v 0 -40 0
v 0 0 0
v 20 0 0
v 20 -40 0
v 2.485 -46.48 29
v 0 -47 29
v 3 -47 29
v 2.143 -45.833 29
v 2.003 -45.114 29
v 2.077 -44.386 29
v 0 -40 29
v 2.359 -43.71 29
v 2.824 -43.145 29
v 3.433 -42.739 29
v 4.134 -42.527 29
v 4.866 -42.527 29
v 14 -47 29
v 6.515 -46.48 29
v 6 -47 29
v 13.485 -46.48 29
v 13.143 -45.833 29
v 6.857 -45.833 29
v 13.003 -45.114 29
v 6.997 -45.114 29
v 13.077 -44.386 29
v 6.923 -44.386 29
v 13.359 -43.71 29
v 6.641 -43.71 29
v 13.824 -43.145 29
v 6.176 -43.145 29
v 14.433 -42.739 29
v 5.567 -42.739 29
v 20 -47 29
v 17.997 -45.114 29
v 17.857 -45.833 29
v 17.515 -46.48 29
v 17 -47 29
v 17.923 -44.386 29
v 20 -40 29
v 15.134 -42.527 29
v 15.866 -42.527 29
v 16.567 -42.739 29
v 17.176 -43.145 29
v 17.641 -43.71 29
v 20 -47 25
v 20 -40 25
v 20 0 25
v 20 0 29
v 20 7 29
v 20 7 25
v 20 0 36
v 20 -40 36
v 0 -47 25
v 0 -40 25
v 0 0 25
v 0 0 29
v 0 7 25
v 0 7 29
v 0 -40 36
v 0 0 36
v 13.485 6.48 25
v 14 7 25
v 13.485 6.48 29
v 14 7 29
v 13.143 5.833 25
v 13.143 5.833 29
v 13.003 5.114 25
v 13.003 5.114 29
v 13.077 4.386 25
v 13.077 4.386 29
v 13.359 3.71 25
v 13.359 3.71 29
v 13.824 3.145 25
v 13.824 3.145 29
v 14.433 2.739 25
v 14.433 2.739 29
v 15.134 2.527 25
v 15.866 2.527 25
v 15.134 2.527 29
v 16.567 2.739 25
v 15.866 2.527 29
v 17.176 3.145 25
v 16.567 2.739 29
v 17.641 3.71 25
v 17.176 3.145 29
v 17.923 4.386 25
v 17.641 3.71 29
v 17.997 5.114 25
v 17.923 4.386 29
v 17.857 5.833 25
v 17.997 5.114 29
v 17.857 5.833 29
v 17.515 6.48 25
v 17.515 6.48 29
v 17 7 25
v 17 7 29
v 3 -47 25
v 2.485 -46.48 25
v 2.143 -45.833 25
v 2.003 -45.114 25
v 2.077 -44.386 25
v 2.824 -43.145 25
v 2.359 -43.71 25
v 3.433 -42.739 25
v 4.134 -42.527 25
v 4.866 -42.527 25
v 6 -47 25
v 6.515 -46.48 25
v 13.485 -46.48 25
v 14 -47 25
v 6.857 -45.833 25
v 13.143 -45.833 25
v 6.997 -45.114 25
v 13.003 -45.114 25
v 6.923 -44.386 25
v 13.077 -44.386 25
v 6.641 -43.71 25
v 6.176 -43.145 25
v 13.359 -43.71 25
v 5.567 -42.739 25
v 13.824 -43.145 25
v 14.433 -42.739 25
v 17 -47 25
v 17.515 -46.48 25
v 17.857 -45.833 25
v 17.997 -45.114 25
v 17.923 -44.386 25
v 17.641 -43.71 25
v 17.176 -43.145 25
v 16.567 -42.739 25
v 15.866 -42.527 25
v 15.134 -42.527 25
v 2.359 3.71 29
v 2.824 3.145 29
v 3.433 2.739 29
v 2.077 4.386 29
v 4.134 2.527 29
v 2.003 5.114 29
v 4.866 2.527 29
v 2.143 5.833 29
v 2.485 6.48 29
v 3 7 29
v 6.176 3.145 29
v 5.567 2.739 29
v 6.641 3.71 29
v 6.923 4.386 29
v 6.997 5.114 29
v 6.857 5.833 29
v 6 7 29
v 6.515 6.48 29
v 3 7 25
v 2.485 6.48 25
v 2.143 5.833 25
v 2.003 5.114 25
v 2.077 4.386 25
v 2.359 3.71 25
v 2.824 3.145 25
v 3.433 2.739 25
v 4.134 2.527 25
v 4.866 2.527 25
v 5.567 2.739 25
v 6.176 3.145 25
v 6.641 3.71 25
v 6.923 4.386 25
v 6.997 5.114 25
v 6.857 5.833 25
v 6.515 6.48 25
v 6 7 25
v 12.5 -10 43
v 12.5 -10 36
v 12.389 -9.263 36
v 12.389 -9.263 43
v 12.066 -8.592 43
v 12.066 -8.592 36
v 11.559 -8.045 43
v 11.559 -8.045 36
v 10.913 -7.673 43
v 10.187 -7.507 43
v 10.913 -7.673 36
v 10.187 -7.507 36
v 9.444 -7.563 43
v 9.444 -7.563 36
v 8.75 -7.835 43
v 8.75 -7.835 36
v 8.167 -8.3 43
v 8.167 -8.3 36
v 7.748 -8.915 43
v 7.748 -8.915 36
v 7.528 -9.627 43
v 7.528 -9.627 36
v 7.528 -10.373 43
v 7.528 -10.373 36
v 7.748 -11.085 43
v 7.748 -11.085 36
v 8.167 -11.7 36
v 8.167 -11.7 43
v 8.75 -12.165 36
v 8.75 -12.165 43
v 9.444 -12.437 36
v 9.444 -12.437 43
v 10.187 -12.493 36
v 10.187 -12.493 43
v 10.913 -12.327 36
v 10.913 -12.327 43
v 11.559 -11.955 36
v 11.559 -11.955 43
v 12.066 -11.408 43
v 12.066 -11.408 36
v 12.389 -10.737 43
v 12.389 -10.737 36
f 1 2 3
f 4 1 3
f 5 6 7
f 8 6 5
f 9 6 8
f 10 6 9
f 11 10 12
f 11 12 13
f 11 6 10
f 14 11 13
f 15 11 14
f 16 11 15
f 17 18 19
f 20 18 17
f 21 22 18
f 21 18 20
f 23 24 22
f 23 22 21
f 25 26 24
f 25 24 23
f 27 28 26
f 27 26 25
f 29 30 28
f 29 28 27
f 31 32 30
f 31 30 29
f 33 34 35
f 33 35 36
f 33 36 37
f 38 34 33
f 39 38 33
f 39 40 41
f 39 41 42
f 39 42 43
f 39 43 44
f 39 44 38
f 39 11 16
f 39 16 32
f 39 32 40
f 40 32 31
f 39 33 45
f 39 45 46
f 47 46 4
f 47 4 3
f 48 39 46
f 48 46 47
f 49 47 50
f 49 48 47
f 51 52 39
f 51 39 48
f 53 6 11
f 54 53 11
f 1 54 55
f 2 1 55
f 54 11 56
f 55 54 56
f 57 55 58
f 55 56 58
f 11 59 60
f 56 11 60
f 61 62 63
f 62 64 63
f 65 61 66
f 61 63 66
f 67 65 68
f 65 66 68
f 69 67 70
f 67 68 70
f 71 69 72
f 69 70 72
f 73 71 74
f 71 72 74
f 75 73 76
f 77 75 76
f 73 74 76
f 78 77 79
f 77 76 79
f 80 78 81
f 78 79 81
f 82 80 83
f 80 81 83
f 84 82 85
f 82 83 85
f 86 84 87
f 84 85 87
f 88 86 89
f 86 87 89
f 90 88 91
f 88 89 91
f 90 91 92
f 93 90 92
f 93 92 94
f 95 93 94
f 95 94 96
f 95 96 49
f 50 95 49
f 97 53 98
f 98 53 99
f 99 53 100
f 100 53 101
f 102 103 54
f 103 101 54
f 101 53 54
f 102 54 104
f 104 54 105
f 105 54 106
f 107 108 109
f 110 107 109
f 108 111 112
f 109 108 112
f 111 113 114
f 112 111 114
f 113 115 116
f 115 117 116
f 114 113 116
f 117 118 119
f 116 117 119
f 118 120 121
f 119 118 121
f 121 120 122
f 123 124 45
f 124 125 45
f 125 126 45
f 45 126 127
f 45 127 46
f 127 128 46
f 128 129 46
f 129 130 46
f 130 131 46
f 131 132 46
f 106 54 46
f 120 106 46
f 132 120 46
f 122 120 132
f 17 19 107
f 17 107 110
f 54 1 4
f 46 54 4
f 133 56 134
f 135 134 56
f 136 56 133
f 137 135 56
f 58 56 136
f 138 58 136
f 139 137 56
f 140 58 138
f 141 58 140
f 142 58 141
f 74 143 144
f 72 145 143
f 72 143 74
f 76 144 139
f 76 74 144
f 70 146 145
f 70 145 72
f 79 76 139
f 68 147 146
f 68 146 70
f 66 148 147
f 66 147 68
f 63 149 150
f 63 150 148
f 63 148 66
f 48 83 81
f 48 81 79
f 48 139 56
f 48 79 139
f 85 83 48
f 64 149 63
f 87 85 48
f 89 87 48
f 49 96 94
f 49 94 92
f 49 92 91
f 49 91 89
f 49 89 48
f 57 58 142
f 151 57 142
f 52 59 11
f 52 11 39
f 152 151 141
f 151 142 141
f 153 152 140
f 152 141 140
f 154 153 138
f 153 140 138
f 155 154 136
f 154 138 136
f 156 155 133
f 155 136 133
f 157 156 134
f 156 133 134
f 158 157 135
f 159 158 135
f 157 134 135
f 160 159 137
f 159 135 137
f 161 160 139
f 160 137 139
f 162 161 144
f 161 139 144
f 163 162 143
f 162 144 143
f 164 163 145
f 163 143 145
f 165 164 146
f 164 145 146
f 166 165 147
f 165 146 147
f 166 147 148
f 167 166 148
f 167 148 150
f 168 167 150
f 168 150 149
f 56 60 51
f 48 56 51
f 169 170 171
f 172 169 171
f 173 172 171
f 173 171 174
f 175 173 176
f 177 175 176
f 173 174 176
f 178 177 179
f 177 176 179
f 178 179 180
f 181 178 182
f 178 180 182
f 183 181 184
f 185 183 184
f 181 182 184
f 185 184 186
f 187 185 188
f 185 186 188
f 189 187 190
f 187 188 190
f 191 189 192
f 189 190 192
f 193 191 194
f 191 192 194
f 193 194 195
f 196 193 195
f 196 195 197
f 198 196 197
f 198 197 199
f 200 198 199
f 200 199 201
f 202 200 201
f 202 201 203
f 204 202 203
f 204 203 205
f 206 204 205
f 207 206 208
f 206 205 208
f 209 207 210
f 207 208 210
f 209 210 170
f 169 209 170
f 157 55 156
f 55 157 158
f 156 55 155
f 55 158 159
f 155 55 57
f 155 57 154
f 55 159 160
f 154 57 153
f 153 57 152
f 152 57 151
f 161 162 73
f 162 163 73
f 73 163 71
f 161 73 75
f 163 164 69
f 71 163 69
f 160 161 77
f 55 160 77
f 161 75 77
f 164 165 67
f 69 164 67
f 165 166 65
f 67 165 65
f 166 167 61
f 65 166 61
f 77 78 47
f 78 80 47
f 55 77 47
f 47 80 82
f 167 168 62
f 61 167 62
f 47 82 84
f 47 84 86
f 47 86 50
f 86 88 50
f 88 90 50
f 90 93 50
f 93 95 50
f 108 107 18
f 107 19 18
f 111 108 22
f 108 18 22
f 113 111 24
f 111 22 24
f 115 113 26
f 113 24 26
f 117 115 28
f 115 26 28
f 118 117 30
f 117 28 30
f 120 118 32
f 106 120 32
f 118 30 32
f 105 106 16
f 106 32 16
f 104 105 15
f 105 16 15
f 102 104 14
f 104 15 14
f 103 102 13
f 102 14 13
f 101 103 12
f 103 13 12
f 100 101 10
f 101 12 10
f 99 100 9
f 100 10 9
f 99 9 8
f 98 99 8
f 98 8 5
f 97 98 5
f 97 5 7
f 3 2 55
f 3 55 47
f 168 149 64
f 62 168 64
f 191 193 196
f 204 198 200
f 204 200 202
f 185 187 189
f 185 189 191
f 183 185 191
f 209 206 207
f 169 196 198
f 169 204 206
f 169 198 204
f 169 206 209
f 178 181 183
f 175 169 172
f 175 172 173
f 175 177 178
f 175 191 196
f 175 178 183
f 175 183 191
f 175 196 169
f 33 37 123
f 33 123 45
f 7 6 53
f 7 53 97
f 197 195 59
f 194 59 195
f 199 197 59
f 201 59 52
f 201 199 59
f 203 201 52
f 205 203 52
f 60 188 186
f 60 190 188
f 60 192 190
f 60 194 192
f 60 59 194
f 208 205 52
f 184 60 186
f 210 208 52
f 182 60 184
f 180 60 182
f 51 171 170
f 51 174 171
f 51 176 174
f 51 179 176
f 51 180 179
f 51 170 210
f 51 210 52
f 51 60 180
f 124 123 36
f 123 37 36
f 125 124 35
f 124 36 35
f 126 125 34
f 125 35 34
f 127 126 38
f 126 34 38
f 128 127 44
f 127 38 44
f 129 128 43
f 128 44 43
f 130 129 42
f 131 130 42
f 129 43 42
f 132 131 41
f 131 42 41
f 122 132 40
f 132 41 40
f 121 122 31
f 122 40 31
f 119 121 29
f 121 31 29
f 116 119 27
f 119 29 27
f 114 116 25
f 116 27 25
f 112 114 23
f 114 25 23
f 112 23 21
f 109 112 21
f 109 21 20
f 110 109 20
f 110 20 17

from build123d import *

# Parameters (mm, degrees)
ESQUISSE1_W             = 20
ESQUISSE1_H             = 40
BOSS_EXTRU_1_DEPTH      = 36
ESQUISSE2_W             = 20
ESQUISSE2_H             = 7
BOSS_EXTRU_2_DEPTH      = 11
ESQUISSE3_W             = 20
ESQUISSE3_H             = 7
ENL_V_MAT_EXTRU_1_DEPTH = 7
ESQUISSE4_R             = 2.5
BOSS_EXTRU_3_DEPTH      = 7
ESQUISSE5_R             = 2.5
ENL_V_MAT_EXTRU_2_DEPTH = 7
ESQUISSE6_R             = 2.5
ENL_V_MAT_EXTRU_3_DEPTH = 7


with BuildPart() as part:
    # Esquisse1 → Boss.-Extru.1 (new body)
    with BuildSketch(Plane.XY):
        with Locations((10, -20)):
            Rectangle(ESQUISSE1_W, ESQUISSE1_H)
    extrude(amount=BOSS_EXTRU_1_DEPTH)

    # Esquisse2 → Boss.-Extru.2 (add)
    with BuildSketch(Plane.XY.offset(36)):
        with Locations((10, 3.5)):
            Rectangle(ESQUISSE2_W, ESQUISSE2_H)
        with Locations((10, -43.5)):
            Rectangle(ESQUISSE2_W, ESQUISSE2_H)
    extrude(amount=-BOSS_EXTRU_2_DEPTH)

    # Esquisse3 → Enlèv. mat.-Extru.1 (cut)
    with BuildSketch(Plane.XY.offset(36)):
        with Locations((10, -43.5)):
            Rectangle(ESQUISSE3_W, ESQUISSE3_H)
        with Locations((10, 3.5)):
            Rectangle(ESQUISSE3_W, ESQUISSE3_H)
    extrude(amount=-ENL_V_MAT_EXTRU_1_DEPTH, mode=Mode.SUBTRACT)

    # Esquisse4 → Boss.-Extru.3 (add)
    with BuildSketch(Plane.XY.offset(36)):
        with Locations((10, -10)):
            Circle(ESQUISSE4_R)
    extrude(amount=BOSS_EXTRU_3_DEPTH)

    # Esquisse5 → Enlèv. mat.-Extru.2 (cut)
    with BuildSketch(Plane.XY.offset(29)):
        with Locations((4.5, -45)):
            Circle(ESQUISSE5_R)
        with Locations((15.5, -45)):
            Circle(ESQUISSE5_R)
    extrude(amount=-ENL_V_MAT_EXTRU_2_DEPTH, mode=Mode.SUBTRACT)

    # Esquisse6 → Enlèv. mat.-Extru.3 (cut)
    with BuildSketch(Plane.XY.offset(29)):
        with Locations((4.5, 5)):
            Circle(ESQUISSE6_R)
        with Locations((15.5, 5)):
            Circle(ESQUISSE6_R)
    extrude(amount=-ENL_V_MAT_EXTRU_3_DEPTH, mode=Mode.SUBTRACT)


solid = part.part
